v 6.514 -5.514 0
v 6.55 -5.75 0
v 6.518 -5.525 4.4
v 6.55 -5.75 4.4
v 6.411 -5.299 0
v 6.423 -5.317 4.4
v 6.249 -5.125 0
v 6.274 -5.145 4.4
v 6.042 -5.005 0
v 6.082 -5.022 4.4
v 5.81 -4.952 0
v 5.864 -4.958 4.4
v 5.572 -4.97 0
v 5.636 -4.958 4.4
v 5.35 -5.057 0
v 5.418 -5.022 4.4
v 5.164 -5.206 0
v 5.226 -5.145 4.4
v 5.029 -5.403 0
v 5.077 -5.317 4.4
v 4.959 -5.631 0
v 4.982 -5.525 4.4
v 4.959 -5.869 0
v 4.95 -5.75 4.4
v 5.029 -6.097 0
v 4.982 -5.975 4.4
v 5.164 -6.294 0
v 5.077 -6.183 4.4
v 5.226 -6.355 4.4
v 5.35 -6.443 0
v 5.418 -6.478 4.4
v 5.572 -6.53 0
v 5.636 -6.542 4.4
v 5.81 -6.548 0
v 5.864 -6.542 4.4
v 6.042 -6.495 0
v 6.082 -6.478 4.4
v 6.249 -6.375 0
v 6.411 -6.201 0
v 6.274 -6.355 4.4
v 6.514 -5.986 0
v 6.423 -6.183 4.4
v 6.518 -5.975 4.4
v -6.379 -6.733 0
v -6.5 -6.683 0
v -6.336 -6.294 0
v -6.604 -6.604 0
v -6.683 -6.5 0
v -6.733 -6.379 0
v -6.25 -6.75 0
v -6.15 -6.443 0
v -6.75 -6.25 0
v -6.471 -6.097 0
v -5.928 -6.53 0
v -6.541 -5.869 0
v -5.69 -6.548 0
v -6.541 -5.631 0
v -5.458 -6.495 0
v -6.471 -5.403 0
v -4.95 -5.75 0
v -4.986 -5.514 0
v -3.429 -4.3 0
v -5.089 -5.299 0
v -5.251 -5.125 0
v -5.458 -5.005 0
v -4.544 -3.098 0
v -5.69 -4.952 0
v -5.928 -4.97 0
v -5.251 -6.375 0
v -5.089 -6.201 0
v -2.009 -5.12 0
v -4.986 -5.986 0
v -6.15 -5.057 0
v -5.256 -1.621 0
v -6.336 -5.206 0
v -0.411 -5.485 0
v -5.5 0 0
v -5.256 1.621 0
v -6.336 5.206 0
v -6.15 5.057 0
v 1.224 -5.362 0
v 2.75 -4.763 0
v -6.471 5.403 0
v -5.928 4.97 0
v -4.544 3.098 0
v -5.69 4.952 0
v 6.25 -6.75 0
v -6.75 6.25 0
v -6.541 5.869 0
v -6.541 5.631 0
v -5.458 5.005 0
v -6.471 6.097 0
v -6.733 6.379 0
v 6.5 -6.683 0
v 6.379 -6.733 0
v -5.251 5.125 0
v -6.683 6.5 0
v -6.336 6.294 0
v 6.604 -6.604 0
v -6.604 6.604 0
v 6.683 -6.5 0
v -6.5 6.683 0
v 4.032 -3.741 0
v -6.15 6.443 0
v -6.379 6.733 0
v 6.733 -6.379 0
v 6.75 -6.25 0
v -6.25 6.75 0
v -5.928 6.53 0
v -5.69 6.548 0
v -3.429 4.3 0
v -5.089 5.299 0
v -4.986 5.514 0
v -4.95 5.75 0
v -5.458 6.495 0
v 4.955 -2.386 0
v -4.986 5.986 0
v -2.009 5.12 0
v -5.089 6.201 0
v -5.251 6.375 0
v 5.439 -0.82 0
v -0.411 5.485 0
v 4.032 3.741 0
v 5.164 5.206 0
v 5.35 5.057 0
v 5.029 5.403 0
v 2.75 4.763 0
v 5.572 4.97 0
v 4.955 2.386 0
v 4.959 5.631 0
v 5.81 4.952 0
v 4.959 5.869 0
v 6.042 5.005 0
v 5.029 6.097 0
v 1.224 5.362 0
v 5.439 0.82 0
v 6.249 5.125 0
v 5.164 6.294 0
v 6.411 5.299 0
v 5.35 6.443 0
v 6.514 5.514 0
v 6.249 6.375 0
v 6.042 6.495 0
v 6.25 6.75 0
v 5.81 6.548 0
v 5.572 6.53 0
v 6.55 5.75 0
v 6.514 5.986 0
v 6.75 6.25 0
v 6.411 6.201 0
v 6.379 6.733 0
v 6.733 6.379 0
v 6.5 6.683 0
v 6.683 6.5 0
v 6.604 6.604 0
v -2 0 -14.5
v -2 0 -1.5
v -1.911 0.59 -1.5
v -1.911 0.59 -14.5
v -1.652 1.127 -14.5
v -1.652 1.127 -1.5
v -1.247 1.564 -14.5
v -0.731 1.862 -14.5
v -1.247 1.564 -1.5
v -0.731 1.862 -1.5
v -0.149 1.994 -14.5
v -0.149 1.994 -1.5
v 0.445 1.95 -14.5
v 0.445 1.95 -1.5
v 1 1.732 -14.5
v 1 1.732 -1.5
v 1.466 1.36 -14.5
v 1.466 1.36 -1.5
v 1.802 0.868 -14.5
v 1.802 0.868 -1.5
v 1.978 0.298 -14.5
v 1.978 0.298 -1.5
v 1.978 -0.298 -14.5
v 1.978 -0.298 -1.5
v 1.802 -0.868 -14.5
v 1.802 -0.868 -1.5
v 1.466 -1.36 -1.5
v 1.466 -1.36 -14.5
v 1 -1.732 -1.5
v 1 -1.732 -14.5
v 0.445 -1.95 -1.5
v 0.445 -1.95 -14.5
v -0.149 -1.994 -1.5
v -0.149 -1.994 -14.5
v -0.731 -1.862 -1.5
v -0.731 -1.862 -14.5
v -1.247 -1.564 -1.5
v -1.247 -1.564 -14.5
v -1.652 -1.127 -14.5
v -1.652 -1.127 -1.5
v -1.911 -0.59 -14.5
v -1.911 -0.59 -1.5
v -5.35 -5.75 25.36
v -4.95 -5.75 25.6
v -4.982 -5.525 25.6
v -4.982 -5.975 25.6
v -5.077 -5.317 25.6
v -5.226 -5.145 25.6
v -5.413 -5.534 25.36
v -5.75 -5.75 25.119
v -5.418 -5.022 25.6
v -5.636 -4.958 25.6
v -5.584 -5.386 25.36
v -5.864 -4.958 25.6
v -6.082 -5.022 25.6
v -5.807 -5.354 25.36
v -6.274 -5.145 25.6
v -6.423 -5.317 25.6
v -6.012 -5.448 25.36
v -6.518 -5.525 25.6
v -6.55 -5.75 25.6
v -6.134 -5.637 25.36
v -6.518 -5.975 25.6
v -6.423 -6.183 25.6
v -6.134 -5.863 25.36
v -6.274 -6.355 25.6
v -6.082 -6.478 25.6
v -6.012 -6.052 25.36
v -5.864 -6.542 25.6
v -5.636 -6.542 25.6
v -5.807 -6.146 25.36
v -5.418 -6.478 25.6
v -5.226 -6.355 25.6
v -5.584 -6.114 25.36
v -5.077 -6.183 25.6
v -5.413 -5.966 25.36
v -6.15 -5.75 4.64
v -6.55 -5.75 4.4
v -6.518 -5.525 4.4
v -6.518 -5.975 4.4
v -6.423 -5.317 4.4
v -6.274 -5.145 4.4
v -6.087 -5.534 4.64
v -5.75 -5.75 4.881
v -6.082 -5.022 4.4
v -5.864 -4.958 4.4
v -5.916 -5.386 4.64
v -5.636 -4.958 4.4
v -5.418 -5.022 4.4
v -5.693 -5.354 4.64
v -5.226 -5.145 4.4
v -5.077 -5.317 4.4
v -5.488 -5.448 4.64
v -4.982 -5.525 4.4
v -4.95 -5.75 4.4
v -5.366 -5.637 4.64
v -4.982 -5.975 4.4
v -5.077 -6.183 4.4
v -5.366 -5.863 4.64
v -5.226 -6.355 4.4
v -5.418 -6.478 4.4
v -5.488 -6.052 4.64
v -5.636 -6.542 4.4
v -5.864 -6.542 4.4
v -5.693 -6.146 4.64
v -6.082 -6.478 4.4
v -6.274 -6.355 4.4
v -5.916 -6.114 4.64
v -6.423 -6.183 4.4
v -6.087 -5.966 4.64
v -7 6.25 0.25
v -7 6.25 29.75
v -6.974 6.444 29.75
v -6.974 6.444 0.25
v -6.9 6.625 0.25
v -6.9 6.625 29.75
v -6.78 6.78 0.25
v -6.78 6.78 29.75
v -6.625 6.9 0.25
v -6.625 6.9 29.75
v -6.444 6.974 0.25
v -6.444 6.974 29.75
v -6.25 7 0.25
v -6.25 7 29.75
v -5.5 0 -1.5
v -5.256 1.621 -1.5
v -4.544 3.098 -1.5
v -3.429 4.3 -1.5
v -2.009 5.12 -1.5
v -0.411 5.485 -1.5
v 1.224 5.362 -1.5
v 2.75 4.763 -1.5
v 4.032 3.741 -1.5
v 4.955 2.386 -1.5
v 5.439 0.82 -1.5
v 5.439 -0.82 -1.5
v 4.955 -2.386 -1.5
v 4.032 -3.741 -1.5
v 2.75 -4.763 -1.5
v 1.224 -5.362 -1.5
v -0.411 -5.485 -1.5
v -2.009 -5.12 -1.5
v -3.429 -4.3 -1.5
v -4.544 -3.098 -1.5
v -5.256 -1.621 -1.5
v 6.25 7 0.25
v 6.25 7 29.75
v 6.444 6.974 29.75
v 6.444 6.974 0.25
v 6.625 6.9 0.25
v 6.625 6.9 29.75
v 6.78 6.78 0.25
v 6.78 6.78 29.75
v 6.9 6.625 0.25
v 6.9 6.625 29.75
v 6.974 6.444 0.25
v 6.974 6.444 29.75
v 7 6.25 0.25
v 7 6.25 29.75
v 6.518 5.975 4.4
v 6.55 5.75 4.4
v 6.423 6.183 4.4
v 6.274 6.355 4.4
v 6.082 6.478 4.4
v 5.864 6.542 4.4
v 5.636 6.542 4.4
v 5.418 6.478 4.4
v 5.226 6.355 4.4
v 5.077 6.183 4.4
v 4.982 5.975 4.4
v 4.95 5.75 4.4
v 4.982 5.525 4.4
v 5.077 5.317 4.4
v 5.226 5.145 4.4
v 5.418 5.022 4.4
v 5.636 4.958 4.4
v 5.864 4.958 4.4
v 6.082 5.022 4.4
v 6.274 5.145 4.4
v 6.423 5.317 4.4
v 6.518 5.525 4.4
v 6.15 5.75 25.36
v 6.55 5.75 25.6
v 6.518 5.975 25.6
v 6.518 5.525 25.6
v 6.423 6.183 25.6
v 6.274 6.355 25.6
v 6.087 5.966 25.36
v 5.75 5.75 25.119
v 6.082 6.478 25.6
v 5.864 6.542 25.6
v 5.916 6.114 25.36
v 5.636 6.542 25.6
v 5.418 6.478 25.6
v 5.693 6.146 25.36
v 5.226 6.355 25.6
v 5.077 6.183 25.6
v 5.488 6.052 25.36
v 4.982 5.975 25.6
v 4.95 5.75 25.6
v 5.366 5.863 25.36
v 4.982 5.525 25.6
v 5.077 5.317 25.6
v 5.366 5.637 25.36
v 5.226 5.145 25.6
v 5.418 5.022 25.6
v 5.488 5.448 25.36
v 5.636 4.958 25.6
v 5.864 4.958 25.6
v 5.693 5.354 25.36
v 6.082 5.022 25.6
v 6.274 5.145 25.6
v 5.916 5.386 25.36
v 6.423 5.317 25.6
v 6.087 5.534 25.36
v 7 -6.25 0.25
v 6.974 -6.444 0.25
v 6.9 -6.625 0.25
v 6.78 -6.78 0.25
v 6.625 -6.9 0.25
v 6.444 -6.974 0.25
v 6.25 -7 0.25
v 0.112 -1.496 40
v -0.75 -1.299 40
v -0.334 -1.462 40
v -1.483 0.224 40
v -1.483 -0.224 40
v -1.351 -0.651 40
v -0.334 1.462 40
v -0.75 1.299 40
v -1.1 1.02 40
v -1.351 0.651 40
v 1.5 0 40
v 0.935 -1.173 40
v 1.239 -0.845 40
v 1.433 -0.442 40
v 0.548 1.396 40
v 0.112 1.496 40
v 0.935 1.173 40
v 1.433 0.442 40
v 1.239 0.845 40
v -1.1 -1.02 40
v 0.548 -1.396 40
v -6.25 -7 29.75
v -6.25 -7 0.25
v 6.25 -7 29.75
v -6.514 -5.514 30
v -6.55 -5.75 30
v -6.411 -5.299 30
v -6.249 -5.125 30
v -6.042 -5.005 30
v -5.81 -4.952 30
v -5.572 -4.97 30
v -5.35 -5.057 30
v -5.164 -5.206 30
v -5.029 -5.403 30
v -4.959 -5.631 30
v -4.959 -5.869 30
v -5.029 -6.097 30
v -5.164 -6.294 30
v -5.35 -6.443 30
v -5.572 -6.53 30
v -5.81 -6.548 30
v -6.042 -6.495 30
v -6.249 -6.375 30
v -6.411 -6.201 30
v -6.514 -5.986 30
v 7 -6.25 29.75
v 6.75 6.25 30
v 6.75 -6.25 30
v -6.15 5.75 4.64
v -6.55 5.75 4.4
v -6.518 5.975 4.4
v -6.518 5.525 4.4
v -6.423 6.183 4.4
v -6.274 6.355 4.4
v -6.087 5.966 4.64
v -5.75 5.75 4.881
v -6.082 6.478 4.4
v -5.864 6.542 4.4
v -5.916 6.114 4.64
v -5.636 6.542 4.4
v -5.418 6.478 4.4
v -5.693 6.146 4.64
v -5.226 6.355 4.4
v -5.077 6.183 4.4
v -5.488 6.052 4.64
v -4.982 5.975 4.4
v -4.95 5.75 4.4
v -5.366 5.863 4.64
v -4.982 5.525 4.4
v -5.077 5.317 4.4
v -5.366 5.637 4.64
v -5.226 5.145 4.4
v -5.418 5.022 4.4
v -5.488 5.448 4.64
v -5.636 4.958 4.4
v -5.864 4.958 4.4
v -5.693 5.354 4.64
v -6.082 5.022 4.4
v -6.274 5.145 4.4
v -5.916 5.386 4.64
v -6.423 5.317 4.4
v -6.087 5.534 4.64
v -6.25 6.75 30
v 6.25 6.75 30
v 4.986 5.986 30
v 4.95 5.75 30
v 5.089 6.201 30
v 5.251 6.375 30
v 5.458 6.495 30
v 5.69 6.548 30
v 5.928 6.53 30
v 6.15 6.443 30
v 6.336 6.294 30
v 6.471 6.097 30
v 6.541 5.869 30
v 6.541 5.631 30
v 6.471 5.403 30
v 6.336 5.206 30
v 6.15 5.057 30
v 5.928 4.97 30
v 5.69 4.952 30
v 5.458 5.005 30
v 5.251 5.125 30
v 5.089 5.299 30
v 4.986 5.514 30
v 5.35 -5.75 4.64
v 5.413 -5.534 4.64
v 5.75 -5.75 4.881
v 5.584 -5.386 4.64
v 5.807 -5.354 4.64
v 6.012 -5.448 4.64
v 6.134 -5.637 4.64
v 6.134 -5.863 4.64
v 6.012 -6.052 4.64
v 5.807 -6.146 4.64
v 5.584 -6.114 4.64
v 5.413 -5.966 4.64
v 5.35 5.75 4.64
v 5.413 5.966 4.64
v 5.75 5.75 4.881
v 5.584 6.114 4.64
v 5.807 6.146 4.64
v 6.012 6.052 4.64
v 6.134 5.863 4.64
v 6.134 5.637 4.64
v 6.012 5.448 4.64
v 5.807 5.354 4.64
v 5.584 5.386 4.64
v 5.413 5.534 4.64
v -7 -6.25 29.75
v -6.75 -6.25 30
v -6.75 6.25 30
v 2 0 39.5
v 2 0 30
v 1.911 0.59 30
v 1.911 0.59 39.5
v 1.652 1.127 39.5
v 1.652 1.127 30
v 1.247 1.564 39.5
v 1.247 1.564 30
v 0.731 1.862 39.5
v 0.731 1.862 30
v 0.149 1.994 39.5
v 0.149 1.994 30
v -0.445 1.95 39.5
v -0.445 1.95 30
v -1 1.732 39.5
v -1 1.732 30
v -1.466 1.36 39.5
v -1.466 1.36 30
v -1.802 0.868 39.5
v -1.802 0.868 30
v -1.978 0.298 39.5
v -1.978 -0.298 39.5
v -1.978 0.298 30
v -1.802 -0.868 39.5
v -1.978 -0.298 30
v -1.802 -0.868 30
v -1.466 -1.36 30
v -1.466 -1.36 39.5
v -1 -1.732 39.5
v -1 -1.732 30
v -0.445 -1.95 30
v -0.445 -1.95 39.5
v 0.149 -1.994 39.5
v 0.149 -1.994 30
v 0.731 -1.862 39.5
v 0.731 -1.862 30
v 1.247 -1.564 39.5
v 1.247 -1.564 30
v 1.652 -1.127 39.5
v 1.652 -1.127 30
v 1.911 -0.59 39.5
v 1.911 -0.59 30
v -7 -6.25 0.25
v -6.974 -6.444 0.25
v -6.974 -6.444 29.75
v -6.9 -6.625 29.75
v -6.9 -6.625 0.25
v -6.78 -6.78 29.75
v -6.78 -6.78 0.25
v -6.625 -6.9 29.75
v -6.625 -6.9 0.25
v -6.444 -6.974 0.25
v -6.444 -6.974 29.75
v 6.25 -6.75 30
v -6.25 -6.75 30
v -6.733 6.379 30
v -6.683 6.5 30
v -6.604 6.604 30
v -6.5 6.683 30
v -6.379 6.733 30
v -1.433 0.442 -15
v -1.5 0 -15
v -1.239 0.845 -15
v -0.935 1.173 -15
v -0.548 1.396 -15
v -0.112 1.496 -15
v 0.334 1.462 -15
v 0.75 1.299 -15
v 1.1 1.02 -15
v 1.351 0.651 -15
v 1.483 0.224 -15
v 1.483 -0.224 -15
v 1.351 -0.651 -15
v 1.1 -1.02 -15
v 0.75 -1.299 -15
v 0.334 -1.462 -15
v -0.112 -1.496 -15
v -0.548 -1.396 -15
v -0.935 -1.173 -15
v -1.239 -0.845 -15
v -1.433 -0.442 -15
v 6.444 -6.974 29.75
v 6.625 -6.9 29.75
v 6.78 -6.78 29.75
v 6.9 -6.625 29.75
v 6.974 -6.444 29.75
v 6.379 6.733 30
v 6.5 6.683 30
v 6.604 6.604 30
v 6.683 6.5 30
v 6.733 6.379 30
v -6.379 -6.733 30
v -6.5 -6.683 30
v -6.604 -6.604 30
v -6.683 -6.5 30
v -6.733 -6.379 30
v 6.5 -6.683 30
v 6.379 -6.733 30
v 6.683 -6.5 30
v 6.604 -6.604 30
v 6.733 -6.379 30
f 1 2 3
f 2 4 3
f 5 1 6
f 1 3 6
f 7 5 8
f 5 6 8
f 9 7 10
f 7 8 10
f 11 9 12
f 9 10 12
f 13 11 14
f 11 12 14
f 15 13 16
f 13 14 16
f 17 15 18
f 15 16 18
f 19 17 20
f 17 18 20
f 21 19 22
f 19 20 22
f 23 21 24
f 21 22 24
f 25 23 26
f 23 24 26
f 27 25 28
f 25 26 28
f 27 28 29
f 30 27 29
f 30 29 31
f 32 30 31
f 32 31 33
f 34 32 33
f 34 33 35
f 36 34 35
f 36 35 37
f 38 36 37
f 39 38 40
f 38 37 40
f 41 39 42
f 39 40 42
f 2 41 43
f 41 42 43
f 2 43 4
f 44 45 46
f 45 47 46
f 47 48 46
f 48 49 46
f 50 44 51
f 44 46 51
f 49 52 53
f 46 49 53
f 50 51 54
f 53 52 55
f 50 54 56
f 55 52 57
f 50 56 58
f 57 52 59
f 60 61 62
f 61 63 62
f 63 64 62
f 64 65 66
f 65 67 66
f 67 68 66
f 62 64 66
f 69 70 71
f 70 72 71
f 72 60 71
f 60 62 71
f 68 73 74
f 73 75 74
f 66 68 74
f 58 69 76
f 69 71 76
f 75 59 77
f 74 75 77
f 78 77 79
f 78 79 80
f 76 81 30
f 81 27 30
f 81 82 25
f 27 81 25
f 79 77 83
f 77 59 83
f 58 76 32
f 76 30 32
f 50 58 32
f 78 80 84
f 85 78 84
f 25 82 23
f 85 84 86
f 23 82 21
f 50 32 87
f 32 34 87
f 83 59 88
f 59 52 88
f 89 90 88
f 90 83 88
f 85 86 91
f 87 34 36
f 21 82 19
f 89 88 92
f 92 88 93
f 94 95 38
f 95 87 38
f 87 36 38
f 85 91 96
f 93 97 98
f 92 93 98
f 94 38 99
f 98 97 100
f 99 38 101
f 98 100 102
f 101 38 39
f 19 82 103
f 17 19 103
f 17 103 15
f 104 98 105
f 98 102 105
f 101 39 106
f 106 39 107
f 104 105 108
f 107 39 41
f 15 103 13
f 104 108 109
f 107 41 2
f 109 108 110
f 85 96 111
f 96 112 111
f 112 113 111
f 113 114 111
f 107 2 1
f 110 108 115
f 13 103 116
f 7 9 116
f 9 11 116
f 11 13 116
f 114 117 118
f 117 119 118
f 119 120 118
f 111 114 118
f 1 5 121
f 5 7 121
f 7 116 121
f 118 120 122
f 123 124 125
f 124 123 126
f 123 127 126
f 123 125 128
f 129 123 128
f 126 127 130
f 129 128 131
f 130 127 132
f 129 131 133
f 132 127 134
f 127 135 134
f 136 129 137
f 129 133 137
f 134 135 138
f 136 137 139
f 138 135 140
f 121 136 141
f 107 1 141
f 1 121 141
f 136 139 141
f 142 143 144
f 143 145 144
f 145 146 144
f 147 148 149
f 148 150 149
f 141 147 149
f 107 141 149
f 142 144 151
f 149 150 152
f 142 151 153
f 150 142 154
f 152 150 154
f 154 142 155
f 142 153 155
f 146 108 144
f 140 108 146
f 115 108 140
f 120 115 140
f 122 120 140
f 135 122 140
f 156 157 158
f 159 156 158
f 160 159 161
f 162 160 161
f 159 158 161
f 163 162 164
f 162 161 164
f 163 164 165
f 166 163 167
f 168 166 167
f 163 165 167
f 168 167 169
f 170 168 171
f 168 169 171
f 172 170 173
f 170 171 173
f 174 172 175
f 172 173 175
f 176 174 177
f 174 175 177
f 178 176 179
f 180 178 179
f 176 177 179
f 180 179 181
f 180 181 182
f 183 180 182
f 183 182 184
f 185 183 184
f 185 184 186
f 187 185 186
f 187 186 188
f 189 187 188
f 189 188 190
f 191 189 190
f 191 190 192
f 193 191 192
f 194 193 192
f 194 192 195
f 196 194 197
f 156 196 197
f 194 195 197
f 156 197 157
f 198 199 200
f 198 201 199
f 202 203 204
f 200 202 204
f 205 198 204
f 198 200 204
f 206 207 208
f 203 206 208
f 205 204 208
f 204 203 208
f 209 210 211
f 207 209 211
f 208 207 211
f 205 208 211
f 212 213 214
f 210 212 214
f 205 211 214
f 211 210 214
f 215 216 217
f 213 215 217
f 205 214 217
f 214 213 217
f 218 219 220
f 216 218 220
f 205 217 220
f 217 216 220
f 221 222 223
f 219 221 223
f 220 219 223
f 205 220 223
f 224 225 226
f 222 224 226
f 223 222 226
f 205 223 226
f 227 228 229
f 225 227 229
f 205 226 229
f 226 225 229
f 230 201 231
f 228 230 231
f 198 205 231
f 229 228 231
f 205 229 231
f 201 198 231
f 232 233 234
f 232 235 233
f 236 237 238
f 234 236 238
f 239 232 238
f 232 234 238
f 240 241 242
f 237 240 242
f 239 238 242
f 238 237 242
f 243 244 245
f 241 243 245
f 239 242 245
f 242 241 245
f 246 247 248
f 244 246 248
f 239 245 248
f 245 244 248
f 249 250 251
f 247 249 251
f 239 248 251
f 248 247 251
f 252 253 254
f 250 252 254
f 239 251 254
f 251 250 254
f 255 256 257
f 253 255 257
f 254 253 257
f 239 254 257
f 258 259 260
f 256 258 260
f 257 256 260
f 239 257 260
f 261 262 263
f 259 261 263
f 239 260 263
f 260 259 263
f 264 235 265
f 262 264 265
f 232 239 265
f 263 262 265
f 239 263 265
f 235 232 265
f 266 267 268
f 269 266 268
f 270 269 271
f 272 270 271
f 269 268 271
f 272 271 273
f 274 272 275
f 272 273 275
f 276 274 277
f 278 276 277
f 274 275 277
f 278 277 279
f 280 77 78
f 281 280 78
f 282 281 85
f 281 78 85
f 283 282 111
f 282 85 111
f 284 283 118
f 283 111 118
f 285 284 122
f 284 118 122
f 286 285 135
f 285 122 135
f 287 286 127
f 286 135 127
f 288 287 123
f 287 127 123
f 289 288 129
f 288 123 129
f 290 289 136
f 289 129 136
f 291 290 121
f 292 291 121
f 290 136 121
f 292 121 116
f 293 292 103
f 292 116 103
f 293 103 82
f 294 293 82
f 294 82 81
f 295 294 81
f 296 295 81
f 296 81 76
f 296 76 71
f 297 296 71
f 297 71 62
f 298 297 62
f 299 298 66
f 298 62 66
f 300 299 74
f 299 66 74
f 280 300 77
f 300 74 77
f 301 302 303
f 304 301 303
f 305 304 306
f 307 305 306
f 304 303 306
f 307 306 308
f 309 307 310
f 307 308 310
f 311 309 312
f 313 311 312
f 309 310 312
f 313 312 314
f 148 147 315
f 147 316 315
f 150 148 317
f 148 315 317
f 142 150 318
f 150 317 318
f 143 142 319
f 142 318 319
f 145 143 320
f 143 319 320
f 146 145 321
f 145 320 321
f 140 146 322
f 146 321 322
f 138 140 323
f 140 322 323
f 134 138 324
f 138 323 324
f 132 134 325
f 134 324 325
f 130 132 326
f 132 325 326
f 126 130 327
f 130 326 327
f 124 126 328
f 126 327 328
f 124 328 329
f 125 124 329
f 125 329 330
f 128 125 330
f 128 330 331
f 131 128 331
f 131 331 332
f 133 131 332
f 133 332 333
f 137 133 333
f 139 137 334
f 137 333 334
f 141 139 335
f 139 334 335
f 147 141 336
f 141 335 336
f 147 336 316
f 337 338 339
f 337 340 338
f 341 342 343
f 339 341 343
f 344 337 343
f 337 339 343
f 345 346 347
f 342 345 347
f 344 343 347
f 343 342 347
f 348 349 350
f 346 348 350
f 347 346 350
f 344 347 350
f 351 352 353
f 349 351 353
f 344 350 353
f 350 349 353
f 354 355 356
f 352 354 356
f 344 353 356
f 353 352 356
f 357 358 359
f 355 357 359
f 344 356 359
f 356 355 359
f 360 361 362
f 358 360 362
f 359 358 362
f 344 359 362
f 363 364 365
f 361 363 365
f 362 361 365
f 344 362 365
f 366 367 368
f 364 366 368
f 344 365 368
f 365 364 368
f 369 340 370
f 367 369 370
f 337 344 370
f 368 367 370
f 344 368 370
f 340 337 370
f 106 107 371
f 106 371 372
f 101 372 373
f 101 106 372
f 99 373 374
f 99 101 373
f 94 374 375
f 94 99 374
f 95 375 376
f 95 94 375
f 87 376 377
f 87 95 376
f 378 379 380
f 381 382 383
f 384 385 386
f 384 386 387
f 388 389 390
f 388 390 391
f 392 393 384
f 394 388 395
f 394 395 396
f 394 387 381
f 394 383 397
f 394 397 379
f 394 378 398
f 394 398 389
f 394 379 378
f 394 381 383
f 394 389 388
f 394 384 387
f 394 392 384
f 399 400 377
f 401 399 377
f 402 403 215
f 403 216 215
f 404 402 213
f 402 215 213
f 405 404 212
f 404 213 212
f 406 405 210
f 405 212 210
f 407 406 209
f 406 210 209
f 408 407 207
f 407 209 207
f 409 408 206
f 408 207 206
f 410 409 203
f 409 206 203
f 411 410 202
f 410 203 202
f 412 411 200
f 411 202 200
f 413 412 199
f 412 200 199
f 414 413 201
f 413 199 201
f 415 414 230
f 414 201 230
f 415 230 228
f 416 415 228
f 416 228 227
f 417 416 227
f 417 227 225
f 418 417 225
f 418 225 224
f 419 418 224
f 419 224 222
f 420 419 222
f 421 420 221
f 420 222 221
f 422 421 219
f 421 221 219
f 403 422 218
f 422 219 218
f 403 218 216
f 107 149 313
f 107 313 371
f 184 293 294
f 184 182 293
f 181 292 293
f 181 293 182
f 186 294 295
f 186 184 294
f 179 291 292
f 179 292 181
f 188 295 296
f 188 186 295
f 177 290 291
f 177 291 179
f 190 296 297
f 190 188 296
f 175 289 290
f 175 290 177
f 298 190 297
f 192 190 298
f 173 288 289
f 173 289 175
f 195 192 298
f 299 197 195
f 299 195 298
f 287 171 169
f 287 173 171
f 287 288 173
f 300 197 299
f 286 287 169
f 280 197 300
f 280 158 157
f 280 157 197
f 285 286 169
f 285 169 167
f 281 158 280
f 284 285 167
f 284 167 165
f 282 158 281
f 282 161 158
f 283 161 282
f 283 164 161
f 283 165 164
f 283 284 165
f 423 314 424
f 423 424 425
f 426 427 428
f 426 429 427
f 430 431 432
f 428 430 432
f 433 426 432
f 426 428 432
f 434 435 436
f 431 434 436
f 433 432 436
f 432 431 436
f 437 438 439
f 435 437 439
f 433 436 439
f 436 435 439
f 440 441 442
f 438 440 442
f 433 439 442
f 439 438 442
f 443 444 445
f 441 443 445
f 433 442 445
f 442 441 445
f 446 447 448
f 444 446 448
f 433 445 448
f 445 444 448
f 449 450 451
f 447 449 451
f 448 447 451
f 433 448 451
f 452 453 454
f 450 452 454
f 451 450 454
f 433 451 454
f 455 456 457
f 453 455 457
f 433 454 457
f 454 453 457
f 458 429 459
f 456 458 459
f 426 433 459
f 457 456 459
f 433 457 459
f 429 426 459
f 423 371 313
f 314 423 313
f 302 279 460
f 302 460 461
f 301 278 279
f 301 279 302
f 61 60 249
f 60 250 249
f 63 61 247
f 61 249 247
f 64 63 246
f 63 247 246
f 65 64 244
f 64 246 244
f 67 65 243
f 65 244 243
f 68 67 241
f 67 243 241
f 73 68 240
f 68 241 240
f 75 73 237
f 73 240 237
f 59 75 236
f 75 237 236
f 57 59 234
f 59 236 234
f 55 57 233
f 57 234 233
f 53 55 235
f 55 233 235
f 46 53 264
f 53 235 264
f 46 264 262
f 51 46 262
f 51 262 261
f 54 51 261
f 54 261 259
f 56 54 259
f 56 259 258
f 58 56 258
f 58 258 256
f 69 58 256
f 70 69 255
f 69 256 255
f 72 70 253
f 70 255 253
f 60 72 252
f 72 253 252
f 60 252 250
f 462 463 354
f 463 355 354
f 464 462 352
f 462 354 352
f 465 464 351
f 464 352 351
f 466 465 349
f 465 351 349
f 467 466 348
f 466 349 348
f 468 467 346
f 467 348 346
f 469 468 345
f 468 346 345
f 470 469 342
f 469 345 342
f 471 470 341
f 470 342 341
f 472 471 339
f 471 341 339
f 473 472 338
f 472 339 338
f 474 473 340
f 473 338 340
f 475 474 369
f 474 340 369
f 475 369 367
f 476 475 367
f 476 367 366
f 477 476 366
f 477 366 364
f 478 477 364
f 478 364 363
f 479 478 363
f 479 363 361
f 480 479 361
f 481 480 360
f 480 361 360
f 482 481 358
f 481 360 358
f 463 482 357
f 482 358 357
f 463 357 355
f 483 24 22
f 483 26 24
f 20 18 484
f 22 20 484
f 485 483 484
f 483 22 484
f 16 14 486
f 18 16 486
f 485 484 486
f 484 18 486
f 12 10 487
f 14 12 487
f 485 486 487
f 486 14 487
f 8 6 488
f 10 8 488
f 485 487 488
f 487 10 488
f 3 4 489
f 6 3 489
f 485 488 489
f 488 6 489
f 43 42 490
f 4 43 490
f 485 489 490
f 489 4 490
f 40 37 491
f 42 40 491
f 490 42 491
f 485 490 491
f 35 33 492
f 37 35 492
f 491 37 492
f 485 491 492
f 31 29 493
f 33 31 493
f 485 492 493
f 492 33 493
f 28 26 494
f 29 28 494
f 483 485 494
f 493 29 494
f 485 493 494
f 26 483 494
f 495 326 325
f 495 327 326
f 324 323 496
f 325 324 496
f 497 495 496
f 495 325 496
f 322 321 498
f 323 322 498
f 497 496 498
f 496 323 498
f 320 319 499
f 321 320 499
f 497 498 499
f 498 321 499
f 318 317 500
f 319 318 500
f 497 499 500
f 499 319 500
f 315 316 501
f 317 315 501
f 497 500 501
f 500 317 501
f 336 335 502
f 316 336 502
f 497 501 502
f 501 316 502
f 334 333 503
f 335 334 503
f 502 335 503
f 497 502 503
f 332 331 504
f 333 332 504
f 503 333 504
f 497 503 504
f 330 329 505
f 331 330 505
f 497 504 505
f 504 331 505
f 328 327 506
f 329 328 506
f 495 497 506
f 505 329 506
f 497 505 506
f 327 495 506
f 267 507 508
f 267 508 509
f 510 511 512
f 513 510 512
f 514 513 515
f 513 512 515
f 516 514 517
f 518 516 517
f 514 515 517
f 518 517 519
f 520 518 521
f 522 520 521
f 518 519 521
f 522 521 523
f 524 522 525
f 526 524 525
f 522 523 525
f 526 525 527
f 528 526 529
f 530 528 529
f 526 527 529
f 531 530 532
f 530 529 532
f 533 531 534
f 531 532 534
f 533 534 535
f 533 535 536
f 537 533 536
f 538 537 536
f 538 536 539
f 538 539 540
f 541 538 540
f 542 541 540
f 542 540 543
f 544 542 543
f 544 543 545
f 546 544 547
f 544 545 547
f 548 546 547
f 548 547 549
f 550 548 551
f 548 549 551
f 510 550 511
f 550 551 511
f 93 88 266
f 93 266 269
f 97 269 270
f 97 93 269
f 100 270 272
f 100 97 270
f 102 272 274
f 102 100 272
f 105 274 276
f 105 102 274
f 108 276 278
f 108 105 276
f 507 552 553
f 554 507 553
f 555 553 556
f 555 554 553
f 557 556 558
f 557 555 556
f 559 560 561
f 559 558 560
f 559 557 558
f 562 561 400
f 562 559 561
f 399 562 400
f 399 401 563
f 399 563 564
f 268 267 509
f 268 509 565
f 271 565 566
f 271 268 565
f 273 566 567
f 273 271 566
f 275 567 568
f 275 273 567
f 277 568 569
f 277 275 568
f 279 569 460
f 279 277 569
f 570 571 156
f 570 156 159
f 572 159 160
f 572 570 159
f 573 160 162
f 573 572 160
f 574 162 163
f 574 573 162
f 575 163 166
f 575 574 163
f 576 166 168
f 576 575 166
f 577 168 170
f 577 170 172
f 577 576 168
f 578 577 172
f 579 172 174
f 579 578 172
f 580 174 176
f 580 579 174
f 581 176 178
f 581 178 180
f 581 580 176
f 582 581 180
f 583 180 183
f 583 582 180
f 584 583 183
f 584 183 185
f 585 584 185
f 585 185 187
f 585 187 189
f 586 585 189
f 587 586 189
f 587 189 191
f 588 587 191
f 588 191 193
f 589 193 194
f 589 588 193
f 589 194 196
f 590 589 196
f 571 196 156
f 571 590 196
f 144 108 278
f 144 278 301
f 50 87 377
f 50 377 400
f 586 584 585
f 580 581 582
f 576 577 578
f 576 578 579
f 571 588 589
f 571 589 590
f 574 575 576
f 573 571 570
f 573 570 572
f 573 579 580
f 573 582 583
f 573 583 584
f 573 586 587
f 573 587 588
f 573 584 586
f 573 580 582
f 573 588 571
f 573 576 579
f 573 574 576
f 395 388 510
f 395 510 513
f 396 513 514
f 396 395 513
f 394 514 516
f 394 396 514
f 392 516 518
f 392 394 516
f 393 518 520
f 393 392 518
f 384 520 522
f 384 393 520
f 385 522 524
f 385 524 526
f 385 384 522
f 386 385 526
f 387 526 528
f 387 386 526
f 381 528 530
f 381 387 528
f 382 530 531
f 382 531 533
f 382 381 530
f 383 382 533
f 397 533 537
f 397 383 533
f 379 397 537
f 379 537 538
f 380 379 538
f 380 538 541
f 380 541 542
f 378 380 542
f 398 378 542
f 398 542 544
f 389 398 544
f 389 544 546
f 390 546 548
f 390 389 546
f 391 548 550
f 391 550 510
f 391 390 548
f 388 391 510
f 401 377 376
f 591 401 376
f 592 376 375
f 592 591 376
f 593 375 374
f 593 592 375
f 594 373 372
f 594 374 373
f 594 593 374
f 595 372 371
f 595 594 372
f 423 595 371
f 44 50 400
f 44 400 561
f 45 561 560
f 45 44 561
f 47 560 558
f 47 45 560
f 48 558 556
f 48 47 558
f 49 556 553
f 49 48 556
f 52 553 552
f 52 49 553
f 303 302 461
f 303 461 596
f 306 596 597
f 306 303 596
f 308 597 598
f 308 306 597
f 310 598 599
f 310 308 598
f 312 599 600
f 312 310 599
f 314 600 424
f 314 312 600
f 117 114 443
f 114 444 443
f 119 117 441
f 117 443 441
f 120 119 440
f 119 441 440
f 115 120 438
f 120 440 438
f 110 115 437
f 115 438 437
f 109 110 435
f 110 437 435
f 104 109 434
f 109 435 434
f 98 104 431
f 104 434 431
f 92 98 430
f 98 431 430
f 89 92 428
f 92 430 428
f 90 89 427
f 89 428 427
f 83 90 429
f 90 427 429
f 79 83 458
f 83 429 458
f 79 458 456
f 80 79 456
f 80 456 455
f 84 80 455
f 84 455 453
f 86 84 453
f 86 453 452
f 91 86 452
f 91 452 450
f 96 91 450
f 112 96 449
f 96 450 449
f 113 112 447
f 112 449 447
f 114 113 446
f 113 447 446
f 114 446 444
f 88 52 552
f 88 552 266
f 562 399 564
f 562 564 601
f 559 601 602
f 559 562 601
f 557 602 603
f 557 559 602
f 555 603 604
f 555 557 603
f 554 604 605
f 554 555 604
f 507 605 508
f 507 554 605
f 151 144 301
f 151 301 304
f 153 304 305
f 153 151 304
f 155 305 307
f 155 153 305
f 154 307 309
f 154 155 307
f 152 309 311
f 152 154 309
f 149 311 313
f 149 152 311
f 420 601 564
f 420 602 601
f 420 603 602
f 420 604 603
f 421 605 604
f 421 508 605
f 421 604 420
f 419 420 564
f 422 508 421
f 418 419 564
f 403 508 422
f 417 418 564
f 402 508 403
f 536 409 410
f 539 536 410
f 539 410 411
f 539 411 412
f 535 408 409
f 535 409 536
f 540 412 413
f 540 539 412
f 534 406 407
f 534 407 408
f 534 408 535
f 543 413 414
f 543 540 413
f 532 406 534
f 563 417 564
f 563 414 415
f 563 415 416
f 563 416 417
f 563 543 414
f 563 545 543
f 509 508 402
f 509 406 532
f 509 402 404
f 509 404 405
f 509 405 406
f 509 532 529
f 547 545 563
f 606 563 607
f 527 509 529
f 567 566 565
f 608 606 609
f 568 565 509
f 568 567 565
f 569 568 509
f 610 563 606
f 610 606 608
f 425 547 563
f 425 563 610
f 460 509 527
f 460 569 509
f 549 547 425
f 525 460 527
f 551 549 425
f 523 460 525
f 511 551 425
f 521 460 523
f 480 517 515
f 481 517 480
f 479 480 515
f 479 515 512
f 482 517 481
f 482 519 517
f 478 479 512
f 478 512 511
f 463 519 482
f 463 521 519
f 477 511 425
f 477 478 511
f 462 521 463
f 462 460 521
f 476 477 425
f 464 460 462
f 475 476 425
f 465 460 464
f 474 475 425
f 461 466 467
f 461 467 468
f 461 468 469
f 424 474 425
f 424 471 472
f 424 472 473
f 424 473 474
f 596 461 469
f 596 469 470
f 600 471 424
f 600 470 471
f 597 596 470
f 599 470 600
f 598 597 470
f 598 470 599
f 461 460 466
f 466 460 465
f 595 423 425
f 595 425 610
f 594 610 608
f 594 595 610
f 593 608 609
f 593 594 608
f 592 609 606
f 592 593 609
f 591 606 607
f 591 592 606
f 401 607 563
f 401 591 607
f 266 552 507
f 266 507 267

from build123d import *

# Parameters (mm, degrees)
SKETCH1_W                 = 14
SKETCH1_H                 = 14
BOSS_EXTRUDE1_DEPTH       = 30
SKETCH2_R                 = 5.5
BOSS_EXTRUDE2_DEPTH       = 1.5
SKETCH3_R                 = 2
BOSS_EXTRUDE4_DEPTH       = 13.5
SKETCH7_R                 = 2
BOSS_EXTRUDE6_DEPTH       = 10
CHAMFER1_SIZE             = 0.5
M2X0_4_TAPPED_HOLE1_D     = 1.6
M2X0_4_TAPPED_HOLE1_DEPTH = 4.4
M2X0_4_TAPPED_HOLE1_TIP   = 0.480688495
FILLET1_R                 = 0.75
CHAMFER2_SIZE             = 0.25
M2X0_4_TAPPED_HOLE2_D     = 1.6
M2X0_4_TAPPED_HOLE2_DEPTH = 4.4
M2X0_4_TAPPED_HOLE2_TIP   = 0.480688495


with BuildPart() as part:
    # Sketch1 → Boss-Extrude1 (new body)
    with BuildSketch(Plane.XY):
        Rectangle(SKETCH1_W, SKETCH1_H)
    extrude(amount=BOSS_EXTRUDE1_DEPTH)

    # Sketch2 → Boss-Extrude2 (add)
    with BuildSketch(Plane(origin=(0, 0, 0), x_dir=(-1, 0, 0), z_dir=(0, 0, -1))):
        Circle(SKETCH2_R)
    extrude(amount=BOSS_EXTRUDE2_DEPTH)

    # Sketch3 → Boss-Extrude4 (add)
    with BuildSketch(Plane(origin=(0, 0, -1.5), x_dir=(-1, 0, 0), z_dir=(0, 0, -1))):
        Circle(SKETCH3_R)
    extrude(amount=BOSS_EXTRUDE4_DEPTH)

    # Sketch7 → Boss-Extrude6 (add)
    with BuildSketch(Plane.XY.offset(30)):
        Circle(SKETCH7_R)
    extrude(amount=BOSS_EXTRUDE6_DEPTH)

    # Chamfer1
    chamfer1_edges = [part.edges().sort_by_distance(p)[0] for p in [
        (2, 0, -15),
        (-2, 0, 40),
    ]]
    chamfer(chamfer1_edges, length=CHAMFER1_SIZE)

    # M2x0.4 Tapped Hole1
    with Locations(Plane(origin=(0, 0, 0), x_dir=(-1, 0, 0), z_dir=(0, 0, -1))):
        with Locations((5.75, 5.75), (-5.75, 5.75), (-5.75, -5.75), (5.75, -5.75)):
            Hole(M2X0_4_TAPPED_HOLE1_D / 2, depth=M2X0_4_TAPPED_HOLE1_DEPTH)
            with Locations((0, 0, -(M2X0_4_TAPPED_HOLE1_DEPTH + M2X0_4_TAPPED_HOLE1_TIP / 2))):  # 118° drill point
                Cone(0, M2X0_4_TAPPED_HOLE1_D / 2, M2X0_4_TAPPED_HOLE1_TIP, mode=Mode.SUBTRACT)

    # Fillet1
    fillet1_edges = [part.edges().sort_by_distance(p)[0] for p in [
        (7, -7, 15),
        (-7, -7, 15),
        (-7, 7, 15),
        (7, 7, 15),
    ]]
    fillet(fillet1_edges, radius=FILLET1_R)

    # Chamfer2
    chamfer2_edges = [part.edges().sort_by_distance(p)[0] for p in [
        (0, 7, 0),
        (0, 7, 30),
        (7, 0, 0),
        (0, -7, 0),
        (-7, 0, 0),
        (-6.780330086, 6.780330086, 0),
        (-6.780330086, -6.780330086, 0),
        (6.780330086, -6.780330086, 0),
        (6.780330086, 6.780330086, 0),
        (7, 0, 30),
        (-7, 0, 30),
        (0, -7, 30),
        (-6.780330086, 6.780330086, 30),
        (-6.780330086, -6.780330086, 30),
        (6.780330086, -6.780330086, 30),
        (6.780330086, 6.780330086, 30),
    ]]
    chamfer(chamfer2_edges, length=CHAMFER2_SIZE)

    # M2x0.4 Tapped Hole2
    with Locations(Plane.XY.offset(30)):
        with Locations((5.75, 5.75), (-5.75, -5.75)):
            Hole(M2X0_4_TAPPED_HOLE2_D / 2, depth=M2X0_4_TAPPED_HOLE2_DEPTH)
            with Locations((0, 0, -(M2X0_4_TAPPED_HOLE2_DEPTH + M2X0_4_TAPPED_HOLE2_TIP / 2))):  # 118° drill point
                Cone(0, M2X0_4_TAPPED_HOLE2_D / 2, M2X0_4_TAPPED_HOLE2_TIP, mode=Mode.SUBTRACT)


solid = part.part
